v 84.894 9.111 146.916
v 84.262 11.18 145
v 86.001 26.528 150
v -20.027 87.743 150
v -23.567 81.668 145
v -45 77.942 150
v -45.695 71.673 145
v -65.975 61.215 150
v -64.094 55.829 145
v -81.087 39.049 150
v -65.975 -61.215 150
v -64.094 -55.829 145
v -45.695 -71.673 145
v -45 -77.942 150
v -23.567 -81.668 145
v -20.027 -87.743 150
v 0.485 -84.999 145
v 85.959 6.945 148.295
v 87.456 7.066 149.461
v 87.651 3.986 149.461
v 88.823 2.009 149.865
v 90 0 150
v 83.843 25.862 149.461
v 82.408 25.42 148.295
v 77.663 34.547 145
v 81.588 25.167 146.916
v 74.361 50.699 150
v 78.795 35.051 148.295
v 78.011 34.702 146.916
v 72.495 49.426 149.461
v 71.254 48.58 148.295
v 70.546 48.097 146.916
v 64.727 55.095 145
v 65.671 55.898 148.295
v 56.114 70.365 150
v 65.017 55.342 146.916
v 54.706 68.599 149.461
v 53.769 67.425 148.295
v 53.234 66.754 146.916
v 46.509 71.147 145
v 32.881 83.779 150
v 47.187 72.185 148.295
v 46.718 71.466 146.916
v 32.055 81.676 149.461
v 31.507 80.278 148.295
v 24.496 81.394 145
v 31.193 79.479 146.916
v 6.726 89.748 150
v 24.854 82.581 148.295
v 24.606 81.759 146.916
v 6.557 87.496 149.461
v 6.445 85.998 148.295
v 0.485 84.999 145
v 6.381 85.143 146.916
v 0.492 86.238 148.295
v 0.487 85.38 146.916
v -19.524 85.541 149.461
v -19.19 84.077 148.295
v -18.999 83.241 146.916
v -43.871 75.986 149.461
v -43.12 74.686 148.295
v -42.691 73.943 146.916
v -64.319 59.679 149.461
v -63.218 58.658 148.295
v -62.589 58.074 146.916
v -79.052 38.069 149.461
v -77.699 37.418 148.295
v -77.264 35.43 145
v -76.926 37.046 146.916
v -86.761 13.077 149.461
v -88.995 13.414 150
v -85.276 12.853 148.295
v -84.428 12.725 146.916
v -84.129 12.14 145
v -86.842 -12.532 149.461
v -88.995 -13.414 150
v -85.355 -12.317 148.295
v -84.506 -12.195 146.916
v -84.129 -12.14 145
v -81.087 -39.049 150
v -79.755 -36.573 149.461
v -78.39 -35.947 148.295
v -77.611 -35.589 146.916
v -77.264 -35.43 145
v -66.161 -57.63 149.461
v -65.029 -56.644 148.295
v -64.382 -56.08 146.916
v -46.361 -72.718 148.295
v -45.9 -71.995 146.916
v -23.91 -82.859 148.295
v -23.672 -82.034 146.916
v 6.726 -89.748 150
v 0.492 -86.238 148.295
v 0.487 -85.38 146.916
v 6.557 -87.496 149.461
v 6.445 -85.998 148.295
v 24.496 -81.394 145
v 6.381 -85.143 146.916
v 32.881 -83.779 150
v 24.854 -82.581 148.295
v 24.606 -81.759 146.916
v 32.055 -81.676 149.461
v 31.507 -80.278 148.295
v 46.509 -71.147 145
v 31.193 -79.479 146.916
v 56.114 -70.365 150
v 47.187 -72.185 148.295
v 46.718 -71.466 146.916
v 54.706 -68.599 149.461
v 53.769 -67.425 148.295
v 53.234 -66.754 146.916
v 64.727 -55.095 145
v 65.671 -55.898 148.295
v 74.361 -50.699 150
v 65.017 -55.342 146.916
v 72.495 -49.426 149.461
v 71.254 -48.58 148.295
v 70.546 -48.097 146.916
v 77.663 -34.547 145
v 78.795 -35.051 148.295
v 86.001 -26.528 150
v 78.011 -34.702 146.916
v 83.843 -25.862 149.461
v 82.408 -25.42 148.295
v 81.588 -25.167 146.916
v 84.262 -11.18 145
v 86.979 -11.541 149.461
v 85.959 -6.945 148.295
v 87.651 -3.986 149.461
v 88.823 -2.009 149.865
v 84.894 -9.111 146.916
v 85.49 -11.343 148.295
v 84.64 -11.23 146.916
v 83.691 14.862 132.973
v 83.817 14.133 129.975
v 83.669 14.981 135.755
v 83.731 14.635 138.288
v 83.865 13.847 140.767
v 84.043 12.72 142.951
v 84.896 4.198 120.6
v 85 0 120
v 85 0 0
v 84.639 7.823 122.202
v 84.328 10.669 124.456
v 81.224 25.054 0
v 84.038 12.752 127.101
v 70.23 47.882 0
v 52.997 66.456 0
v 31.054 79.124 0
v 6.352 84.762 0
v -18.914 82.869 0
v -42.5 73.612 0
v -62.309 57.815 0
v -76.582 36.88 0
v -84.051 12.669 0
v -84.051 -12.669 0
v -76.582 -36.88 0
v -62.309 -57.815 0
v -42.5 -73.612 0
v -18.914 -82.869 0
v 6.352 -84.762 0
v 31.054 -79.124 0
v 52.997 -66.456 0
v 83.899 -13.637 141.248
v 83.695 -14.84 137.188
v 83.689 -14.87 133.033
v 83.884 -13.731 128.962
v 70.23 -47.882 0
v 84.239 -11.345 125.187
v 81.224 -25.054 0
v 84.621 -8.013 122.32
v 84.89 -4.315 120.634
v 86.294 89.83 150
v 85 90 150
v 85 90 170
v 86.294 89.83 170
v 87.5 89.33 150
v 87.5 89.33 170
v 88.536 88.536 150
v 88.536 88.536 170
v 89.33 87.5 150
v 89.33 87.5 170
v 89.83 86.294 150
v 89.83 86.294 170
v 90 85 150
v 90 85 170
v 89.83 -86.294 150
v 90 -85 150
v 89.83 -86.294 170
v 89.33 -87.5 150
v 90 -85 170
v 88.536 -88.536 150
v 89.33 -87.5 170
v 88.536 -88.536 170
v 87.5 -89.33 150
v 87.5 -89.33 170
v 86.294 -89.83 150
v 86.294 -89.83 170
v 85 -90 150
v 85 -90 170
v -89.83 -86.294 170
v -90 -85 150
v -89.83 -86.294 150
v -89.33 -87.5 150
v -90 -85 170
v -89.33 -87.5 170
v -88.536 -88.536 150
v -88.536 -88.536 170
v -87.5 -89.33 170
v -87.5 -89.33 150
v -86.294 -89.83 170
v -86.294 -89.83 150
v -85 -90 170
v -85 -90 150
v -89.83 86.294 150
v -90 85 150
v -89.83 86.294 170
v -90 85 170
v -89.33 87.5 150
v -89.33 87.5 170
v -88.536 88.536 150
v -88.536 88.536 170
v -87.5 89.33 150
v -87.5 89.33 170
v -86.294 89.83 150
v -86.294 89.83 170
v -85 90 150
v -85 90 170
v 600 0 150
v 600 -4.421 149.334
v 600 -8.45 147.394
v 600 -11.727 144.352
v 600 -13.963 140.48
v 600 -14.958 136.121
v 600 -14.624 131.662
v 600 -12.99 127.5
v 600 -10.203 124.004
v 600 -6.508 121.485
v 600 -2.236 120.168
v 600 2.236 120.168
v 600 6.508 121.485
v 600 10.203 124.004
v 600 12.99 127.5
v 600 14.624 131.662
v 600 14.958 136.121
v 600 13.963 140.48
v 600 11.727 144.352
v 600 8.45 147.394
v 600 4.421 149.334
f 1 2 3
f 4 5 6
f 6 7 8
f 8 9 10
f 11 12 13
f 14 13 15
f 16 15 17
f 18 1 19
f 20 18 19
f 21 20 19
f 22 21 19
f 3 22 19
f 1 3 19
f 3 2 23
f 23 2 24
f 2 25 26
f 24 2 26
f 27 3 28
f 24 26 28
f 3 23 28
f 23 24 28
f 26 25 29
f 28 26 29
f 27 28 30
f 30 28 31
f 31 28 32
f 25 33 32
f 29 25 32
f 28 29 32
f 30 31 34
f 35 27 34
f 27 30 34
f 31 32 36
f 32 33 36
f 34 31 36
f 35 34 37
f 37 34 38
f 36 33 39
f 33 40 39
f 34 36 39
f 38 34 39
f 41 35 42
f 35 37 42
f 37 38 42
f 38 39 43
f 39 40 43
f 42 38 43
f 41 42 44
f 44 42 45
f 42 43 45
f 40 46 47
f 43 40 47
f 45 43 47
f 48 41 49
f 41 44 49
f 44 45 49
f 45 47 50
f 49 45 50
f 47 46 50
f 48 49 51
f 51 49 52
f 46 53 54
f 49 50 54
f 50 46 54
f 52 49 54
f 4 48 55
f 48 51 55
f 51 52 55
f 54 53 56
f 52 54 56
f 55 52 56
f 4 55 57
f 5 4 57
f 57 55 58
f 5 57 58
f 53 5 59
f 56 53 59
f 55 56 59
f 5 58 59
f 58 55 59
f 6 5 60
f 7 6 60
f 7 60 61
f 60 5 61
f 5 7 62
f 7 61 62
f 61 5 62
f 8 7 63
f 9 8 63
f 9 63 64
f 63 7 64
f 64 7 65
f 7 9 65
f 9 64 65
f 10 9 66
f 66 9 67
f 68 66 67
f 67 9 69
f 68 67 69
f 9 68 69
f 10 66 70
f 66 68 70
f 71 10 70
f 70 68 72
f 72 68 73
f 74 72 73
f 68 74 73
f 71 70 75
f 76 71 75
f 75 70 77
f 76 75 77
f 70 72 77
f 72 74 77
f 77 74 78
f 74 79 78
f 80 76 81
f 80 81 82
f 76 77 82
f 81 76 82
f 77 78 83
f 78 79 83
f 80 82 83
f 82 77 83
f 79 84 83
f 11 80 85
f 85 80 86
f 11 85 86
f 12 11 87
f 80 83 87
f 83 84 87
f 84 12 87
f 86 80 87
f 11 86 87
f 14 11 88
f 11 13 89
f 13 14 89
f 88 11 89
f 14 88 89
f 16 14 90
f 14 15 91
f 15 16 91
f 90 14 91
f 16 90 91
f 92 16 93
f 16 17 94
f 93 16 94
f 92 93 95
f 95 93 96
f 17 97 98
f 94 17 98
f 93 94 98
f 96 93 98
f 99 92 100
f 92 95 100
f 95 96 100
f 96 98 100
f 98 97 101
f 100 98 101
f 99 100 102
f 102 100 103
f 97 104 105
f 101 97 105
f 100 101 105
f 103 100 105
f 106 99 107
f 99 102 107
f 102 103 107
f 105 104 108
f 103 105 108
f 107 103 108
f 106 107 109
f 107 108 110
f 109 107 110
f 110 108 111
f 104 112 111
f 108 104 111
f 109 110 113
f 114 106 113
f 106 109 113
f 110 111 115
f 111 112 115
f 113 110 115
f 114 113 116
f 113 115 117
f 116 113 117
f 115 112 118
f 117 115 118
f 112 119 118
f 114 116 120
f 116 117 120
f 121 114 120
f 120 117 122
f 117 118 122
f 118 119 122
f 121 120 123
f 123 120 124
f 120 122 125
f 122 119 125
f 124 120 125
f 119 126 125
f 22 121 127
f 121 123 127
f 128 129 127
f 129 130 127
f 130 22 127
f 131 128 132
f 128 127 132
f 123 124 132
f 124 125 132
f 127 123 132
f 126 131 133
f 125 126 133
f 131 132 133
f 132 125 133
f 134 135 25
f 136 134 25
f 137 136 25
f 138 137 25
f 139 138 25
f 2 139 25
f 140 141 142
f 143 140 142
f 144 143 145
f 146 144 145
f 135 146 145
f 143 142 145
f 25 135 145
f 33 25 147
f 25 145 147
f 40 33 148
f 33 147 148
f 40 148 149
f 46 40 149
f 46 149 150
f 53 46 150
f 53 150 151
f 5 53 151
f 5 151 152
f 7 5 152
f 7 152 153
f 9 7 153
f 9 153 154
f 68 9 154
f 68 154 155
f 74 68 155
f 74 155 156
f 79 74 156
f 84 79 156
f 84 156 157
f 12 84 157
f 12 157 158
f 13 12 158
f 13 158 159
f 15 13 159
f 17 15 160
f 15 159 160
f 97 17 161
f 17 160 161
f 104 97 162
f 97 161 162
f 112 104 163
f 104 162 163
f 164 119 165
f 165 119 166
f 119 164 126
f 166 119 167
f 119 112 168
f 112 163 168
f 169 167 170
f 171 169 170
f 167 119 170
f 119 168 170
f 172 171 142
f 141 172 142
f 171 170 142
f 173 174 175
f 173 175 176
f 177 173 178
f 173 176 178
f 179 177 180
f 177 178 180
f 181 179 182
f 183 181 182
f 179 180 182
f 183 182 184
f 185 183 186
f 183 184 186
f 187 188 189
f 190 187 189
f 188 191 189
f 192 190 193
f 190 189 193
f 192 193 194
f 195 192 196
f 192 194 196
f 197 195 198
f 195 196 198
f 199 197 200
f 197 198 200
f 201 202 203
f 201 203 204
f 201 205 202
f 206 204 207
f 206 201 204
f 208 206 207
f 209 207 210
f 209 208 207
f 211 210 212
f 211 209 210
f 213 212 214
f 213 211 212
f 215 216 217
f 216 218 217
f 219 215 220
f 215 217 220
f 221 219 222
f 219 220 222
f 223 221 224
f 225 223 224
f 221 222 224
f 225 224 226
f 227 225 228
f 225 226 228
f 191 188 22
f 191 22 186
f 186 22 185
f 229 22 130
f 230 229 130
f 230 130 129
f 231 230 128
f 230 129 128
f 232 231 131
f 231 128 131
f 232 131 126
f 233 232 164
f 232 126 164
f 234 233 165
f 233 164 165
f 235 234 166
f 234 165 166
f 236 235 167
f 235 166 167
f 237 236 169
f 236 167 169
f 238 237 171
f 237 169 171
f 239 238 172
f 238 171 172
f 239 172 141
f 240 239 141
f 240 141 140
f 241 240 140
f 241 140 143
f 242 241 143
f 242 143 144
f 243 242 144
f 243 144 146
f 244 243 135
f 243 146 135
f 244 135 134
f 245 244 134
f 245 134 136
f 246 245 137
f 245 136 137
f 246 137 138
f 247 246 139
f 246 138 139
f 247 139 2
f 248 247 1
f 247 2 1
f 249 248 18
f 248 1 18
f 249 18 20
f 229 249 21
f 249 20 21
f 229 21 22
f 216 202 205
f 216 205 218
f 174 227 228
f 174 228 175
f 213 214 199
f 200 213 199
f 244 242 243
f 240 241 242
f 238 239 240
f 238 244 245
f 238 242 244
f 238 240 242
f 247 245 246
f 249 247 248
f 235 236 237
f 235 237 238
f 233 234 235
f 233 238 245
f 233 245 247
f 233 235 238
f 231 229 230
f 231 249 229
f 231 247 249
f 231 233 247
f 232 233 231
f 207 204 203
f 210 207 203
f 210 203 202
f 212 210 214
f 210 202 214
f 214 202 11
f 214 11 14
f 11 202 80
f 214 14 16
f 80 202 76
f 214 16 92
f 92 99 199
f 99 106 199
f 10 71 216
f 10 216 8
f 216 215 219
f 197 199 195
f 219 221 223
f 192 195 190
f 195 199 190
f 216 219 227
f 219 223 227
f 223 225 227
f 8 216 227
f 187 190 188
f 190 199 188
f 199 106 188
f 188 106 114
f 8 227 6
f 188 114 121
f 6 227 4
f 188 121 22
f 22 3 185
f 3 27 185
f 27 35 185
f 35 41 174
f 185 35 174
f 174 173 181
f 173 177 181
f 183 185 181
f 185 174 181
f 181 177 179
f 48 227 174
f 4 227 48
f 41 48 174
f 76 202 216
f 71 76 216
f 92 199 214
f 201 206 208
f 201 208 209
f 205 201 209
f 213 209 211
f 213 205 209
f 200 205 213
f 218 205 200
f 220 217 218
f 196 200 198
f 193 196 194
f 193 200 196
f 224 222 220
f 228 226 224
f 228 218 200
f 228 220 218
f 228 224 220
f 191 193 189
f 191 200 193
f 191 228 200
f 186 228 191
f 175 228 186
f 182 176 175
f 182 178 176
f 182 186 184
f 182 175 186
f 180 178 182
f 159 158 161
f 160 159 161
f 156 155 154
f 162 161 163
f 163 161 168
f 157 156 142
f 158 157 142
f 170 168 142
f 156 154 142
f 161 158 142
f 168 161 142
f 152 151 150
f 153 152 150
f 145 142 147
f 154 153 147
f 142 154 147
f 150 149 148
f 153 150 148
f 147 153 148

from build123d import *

# Parameters (mm, degrees)
ESQUISSE1_R        = 85
BOSS_EXTRU_1_DEPTH = 150
ESQUISSE2_W        = 180
ESQUISSE2_H        = 180
BOSS_EXTRU_2_DEPTH = 20
CONG_1_R           = 5
CONG_2_R           = 5
CONG_3_R           = 5
CONG_4_R           = 5
CONG_5_R           = 5
ESQUISSE4_R        = 15
BOSS_EXTRU_3_DEPTH = 600


with BuildPart() as part:
    # Esquisse1 → Boss.-Extru.1 (new body)
    with BuildSketch(Plane.XY):
        Circle(ESQUISSE1_R)
    extrude(amount=BOSS_EXTRU_1_DEPTH)

    # Esquisse2 → Boss.-Extru.2 (add)
    with BuildSketch(Plane.XY.offset(150)):
        Rectangle(ESQUISSE2_W, ESQUISSE2_H)
    extrude(amount=BOSS_EXTRU_2_DEPTH)

    # Congé1
    cong_1_edges = [part.edges().sort_by_distance(p)[0] for p in [
        (-85, 0, 150),
    ]]
    fillet(cong_1_edges, radius=CONG_1_R - 0.0001)  # a hair under: the kernel refuses the full size

    # Congé2
    cong_2_edges = [part.edges().sort_by_distance(p)[0] for p in [
        (-90, 90, 160),
    ]]
    fillet(cong_2_edges, radius=CONG_2_R)

    # Congé3
    cong_3_edges = [part.edges().sort_by_distance(p)[0] for p in [
        (-90, -90, 160),
    ]]
    fillet(cong_3_edges, radius=CONG_3_R)

    # Congé4
    cong_4_edges = [part.edges().sort_by_distance(p)[0] for p in [
        (90, 90, 160),
    ]]
    fillet(cong_4_edges, radius=CONG_4_R)

    # Congé5
    cong_5_edges = [part.edges().sort_by_distance(p)[0] for p in [
        (90, -90, 160),
    ]]
    fillet(cong_5_edges, radius=CONG_5_R)

    # Esquisse4 → Boss.-Extru.3 (add)
    with BuildSketch(Plane(origin=(0, 0, 0), x_dir=(0, 0, -1), z_dir=(1, 0, 0))):
        with Locations(Location((-135, 0, 0), (0, 0, 180))):
            Circle(ESQUISSE4_R)
    extrude(amount=BOSS_EXTRU_3_DEPTH)


solid = part.part
